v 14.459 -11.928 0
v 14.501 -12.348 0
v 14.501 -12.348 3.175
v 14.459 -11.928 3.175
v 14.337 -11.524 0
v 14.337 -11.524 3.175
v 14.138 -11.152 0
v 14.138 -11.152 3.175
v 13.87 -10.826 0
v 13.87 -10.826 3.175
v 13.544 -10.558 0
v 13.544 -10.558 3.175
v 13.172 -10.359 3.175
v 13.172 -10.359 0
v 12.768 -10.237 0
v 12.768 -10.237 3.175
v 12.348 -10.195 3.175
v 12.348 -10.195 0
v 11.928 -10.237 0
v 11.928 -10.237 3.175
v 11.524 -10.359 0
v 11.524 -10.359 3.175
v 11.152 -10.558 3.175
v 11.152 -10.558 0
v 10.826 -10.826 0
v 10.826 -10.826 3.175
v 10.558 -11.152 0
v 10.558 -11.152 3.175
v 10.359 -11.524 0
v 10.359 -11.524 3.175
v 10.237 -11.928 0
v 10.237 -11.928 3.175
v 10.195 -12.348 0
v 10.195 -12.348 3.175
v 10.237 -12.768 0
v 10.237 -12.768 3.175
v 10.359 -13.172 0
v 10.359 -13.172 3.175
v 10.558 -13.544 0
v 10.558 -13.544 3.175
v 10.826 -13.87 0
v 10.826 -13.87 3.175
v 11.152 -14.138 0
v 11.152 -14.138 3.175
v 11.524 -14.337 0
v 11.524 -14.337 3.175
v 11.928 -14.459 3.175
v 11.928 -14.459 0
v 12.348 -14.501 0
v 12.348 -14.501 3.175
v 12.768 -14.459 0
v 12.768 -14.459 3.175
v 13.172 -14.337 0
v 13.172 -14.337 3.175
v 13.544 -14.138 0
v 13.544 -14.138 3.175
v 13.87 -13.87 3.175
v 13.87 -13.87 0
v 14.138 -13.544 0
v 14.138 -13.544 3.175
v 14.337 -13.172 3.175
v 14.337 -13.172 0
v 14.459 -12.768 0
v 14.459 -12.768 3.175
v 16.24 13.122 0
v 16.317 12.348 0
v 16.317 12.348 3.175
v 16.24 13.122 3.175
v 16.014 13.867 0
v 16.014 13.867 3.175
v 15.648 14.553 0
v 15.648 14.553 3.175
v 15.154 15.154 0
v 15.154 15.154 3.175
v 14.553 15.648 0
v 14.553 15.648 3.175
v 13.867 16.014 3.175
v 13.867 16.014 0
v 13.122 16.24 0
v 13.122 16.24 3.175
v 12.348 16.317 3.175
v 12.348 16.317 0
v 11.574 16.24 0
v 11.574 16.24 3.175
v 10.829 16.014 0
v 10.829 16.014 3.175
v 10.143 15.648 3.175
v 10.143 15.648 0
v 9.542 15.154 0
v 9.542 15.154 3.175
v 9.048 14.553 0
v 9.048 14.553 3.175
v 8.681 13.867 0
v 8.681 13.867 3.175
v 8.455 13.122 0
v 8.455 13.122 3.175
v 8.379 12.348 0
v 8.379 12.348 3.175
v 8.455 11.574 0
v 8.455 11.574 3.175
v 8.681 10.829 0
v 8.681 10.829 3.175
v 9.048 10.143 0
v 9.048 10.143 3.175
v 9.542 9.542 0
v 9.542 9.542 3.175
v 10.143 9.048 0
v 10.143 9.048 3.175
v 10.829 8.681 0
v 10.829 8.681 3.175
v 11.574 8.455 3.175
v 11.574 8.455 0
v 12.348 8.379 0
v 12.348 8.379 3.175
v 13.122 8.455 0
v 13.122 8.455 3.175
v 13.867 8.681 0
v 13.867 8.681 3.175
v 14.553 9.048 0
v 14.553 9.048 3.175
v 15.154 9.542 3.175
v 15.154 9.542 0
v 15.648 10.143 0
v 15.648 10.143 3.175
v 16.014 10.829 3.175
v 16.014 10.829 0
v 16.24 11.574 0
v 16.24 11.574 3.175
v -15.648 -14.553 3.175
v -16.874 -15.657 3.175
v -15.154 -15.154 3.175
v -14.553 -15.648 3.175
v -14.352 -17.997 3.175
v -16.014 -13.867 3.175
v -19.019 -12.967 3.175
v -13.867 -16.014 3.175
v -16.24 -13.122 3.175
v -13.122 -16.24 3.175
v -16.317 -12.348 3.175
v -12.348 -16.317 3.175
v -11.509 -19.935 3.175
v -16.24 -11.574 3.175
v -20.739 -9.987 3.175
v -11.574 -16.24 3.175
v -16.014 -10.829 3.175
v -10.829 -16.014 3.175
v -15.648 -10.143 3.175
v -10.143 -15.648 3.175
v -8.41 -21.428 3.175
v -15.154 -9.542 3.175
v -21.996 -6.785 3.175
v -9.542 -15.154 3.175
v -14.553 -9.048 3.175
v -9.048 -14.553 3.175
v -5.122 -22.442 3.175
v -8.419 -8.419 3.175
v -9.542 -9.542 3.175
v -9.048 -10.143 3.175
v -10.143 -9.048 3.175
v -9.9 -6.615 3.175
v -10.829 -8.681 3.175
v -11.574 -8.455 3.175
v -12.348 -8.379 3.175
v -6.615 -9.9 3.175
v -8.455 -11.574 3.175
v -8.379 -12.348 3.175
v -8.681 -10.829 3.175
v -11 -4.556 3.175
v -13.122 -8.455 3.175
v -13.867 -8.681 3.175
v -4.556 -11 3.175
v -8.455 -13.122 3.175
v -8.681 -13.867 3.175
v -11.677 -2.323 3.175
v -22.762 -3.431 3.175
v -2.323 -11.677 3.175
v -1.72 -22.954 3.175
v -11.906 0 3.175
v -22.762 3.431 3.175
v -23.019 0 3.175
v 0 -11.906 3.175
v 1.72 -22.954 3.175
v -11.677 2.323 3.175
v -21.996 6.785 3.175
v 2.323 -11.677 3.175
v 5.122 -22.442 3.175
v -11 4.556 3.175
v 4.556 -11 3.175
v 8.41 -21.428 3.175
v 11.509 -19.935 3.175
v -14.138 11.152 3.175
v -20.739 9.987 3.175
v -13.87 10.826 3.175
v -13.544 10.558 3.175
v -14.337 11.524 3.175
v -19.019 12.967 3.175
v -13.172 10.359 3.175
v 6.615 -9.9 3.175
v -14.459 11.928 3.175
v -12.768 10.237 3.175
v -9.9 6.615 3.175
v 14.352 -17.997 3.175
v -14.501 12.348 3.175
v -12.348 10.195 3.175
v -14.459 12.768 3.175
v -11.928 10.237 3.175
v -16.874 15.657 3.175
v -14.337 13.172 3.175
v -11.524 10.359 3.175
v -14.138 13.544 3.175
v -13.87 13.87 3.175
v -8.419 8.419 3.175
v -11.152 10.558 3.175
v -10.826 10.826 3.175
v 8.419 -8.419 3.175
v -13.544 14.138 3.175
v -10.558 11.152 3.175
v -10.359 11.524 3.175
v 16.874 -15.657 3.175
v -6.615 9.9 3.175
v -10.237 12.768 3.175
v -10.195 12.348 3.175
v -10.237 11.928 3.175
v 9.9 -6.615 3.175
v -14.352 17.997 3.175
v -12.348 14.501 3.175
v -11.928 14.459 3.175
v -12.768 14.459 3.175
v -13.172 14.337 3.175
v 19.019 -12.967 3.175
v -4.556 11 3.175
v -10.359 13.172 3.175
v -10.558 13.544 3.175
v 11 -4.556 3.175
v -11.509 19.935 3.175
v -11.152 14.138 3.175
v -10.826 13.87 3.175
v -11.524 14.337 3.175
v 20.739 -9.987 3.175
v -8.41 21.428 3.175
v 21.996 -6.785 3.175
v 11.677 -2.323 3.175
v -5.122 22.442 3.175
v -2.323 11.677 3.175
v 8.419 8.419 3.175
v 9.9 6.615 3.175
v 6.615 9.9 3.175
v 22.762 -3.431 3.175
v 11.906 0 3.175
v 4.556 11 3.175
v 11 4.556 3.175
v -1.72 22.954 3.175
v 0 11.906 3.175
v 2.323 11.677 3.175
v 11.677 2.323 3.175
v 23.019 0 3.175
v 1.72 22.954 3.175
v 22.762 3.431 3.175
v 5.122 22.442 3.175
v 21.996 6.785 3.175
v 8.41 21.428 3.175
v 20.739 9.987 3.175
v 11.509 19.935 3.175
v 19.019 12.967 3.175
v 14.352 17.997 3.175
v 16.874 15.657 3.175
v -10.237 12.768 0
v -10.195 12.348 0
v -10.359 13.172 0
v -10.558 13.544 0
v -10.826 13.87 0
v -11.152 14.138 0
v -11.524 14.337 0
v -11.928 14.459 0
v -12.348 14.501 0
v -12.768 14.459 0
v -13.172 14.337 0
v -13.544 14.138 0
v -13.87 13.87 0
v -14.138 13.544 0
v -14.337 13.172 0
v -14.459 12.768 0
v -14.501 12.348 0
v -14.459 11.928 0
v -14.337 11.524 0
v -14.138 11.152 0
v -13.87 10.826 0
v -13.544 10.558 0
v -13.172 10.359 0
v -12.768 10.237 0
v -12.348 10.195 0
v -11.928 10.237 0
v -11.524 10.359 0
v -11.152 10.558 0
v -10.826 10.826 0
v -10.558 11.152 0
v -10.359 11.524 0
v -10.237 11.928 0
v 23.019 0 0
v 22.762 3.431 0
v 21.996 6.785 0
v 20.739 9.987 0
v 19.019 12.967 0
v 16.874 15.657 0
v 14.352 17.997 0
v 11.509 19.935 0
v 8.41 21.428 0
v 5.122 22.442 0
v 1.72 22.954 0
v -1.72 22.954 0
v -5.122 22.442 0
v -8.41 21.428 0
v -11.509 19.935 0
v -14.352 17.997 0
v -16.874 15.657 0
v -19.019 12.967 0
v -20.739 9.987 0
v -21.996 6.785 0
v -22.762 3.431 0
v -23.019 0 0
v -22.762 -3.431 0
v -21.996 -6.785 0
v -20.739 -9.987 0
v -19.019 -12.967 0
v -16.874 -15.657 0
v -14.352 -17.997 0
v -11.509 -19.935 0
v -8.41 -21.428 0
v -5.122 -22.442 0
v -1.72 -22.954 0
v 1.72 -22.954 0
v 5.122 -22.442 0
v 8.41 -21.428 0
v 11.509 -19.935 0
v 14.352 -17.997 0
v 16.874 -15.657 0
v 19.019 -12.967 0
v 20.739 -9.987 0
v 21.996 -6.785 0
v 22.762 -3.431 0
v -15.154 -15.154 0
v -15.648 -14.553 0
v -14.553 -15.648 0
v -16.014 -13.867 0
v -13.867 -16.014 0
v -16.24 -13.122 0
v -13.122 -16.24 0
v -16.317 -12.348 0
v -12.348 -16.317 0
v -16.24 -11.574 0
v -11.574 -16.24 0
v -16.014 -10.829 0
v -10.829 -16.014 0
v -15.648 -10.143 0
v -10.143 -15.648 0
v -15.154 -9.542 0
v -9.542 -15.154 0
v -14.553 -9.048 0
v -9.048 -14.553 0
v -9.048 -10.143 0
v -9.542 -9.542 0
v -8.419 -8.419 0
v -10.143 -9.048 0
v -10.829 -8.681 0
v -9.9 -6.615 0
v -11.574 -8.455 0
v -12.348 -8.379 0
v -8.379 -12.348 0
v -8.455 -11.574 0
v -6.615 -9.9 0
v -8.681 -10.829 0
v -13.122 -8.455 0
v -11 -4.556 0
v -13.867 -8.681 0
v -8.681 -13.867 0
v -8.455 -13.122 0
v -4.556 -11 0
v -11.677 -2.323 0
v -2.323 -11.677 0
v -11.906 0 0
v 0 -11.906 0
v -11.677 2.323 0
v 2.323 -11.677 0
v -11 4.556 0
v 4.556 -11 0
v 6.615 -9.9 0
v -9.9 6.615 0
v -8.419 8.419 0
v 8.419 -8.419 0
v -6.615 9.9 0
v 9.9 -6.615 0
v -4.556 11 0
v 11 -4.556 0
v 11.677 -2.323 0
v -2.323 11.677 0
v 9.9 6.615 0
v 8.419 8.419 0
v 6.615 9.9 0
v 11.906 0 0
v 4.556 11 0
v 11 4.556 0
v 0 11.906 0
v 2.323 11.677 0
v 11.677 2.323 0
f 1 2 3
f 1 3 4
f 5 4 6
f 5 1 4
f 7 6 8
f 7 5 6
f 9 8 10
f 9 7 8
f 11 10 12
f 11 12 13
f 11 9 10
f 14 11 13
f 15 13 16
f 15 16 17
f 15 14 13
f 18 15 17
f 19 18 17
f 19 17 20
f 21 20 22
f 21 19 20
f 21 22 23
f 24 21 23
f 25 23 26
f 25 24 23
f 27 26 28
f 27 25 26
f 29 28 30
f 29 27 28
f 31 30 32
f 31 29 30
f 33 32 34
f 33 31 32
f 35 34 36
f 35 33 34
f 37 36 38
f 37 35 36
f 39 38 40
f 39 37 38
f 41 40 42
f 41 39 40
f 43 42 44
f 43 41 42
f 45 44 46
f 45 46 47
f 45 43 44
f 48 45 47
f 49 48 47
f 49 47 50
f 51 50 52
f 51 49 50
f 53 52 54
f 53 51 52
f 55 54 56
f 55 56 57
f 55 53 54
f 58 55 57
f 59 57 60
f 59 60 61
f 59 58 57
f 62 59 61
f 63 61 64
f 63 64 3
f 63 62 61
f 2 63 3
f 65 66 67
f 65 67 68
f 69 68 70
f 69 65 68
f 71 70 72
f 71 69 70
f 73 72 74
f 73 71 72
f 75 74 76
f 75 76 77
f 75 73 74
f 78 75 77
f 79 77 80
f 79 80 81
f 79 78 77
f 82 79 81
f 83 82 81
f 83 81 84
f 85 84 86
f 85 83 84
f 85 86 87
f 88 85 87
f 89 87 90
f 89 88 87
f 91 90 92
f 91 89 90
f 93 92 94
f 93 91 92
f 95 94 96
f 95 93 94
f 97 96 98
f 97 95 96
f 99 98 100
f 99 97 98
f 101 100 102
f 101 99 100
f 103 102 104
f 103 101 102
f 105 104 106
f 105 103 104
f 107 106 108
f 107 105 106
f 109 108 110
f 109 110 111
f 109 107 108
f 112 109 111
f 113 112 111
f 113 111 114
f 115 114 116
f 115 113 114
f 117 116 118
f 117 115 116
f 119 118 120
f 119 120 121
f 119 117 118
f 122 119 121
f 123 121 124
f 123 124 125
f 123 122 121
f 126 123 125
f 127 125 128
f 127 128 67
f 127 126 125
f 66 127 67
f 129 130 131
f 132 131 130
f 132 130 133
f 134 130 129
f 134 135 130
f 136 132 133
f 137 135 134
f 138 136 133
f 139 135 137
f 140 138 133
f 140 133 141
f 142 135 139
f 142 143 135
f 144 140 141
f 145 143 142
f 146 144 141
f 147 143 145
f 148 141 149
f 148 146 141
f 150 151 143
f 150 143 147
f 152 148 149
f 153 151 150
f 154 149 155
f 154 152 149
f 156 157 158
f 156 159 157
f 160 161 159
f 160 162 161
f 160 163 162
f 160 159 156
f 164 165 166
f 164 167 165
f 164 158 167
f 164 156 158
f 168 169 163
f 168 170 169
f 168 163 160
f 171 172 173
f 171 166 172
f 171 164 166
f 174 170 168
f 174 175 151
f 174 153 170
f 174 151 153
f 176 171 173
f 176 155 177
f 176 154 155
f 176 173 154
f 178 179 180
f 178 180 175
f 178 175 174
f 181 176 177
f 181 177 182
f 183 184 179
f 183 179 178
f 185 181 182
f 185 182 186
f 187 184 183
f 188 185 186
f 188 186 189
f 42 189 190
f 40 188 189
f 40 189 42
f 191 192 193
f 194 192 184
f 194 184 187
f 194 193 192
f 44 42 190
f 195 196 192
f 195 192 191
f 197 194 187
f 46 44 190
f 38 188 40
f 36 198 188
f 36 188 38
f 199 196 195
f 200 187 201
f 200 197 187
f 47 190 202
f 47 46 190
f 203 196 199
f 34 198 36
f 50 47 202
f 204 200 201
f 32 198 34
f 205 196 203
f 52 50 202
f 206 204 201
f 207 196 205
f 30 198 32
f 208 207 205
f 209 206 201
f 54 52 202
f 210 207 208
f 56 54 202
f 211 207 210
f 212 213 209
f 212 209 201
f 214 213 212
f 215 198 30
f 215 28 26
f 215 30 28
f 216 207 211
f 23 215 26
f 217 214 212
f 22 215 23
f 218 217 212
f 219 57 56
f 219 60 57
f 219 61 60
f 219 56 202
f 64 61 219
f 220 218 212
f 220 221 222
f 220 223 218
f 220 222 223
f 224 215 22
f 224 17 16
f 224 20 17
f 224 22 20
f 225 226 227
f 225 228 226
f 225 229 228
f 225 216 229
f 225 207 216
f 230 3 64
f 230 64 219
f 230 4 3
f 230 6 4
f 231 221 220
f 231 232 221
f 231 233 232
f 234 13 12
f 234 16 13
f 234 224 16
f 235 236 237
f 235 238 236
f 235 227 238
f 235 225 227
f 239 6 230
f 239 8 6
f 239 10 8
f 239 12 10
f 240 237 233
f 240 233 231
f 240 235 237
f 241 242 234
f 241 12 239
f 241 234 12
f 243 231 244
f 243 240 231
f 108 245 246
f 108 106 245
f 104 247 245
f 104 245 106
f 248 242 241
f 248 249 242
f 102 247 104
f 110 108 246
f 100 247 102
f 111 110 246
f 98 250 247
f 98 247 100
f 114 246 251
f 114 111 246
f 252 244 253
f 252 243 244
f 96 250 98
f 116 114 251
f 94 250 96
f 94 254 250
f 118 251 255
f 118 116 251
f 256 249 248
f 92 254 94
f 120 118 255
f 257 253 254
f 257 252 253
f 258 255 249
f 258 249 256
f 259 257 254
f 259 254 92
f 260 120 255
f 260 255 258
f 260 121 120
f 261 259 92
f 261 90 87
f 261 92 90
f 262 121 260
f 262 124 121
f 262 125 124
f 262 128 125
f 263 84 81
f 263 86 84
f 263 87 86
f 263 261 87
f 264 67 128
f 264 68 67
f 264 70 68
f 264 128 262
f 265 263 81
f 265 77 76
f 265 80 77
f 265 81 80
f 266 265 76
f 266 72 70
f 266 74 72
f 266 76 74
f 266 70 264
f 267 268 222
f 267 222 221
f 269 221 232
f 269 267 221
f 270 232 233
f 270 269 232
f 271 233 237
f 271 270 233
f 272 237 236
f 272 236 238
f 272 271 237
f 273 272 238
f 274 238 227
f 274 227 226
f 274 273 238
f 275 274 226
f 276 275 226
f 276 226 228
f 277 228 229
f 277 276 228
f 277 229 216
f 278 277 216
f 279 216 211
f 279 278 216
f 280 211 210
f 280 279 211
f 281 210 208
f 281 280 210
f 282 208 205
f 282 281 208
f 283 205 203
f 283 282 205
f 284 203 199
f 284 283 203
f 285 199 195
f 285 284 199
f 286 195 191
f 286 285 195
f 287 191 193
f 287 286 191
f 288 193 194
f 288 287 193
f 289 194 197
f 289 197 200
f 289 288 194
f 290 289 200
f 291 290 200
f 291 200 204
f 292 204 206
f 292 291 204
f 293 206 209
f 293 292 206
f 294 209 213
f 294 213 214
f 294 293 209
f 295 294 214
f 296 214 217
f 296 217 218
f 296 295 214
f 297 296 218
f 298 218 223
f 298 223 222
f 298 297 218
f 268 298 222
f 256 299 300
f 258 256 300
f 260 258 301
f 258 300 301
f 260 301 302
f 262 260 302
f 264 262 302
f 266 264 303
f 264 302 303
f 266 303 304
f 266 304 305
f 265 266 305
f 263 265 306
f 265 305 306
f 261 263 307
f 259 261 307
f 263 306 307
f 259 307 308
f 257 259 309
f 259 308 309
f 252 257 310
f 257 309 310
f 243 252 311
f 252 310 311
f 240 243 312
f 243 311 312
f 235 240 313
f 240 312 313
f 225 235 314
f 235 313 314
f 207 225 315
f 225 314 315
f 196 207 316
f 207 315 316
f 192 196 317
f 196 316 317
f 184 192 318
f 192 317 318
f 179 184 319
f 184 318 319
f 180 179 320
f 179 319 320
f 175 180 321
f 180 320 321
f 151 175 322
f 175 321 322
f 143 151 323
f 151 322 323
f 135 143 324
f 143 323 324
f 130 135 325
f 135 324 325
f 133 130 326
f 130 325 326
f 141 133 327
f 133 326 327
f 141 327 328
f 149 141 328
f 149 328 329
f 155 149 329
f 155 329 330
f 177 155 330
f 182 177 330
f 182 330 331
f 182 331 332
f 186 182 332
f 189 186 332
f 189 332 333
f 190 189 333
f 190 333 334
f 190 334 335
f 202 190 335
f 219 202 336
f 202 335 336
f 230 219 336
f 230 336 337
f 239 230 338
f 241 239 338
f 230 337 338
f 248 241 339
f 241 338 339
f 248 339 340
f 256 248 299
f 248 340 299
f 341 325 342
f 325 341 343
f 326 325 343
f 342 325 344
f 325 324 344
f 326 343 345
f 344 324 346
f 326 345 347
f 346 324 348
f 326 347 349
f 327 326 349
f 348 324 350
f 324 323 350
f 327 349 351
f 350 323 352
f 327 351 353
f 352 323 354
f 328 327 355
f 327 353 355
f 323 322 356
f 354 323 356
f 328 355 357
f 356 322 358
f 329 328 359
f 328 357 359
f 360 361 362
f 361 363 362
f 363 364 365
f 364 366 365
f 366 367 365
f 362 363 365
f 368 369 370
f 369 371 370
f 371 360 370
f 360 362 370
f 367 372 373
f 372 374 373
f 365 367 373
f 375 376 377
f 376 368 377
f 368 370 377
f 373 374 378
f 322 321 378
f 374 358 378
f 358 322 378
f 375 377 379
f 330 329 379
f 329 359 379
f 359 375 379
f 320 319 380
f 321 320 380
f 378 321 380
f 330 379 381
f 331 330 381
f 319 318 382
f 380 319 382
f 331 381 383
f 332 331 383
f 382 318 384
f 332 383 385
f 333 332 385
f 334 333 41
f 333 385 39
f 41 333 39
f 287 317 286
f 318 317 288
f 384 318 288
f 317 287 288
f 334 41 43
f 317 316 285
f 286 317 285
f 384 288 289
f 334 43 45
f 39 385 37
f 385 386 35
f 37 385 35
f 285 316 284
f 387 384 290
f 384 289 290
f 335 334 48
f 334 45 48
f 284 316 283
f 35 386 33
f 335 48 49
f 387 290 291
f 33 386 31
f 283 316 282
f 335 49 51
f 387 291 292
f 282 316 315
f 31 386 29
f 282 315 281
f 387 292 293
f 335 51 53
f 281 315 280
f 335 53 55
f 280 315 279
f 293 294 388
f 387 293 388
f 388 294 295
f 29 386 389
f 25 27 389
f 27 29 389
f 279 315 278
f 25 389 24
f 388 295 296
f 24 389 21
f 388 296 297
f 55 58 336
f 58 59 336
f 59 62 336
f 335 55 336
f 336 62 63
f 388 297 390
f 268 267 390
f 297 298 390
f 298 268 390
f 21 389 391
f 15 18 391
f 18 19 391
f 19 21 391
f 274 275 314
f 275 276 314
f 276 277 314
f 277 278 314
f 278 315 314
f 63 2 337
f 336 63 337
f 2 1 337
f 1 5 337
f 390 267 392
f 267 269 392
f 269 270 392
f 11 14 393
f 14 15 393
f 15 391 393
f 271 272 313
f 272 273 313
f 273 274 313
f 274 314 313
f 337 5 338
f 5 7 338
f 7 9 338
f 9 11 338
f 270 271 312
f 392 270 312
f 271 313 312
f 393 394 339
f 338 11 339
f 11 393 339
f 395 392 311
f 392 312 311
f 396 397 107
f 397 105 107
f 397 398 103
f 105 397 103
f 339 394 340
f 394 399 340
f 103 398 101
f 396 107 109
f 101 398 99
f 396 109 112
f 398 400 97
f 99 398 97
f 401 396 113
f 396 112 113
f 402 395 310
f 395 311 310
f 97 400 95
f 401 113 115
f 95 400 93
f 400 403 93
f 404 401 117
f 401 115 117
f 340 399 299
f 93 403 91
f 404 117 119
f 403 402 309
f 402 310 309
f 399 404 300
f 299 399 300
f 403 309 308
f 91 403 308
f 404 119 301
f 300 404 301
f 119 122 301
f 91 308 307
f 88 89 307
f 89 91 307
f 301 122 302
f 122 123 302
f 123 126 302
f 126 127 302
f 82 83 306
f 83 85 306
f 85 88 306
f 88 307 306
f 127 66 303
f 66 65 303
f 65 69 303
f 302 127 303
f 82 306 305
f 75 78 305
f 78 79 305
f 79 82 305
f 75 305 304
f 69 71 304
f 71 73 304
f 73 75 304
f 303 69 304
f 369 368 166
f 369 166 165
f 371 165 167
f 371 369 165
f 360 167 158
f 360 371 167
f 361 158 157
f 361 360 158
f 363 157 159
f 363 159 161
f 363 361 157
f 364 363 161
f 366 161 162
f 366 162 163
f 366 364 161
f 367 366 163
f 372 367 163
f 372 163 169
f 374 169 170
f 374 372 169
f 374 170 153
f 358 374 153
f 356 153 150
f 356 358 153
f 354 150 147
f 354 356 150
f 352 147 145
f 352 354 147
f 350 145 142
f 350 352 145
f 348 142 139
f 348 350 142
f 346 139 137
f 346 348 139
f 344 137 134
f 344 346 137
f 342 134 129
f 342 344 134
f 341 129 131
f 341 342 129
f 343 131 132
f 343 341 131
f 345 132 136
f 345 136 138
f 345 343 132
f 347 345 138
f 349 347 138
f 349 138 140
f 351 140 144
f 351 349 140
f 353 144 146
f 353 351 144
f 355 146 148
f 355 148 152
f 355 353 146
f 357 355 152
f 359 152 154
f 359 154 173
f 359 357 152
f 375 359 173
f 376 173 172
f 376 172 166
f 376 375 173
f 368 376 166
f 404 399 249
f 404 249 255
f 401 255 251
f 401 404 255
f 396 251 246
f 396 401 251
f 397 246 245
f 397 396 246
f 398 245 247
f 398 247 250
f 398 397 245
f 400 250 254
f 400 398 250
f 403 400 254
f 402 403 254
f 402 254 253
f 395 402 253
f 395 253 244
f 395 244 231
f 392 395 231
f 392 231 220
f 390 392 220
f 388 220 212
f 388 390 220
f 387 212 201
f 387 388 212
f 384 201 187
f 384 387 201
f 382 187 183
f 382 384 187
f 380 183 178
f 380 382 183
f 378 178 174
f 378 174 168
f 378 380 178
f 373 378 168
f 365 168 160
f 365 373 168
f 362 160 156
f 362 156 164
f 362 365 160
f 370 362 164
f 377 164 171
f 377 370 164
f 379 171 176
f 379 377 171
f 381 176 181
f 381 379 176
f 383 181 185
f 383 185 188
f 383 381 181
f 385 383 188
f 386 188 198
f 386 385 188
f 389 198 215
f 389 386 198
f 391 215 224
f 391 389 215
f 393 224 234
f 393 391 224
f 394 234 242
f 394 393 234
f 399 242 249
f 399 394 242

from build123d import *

# Parameters (mm, degrees)
F0_R     = 23.01875
F0_R_2   = 3.96875
F0_R_3   = 2.15265
F0_R_4   = 11.90625
F1_DEPTH = 3.175


with BuildPart() as f1:
    # F0 (on Top) → F1 (new body)
    with BuildSketch(Plane.XY):
        Circle(F0_R)
        with Locations((-12.347852, -12.347852)):
            Circle(F0_R_2, mode=Mode.SUBTRACT)
        with Locations((12.347852, -12.347852)):
            Circle(F0_R_3, mode=Mode.SUBTRACT)
        with Locations((-12.347852, 12.347852)):
            Circle(F0_R_3, mode=Mode.SUBTRACT)
        Circle(F0_R_4, mode=Mode.SUBTRACT)
        with Locations((12.347852, 12.347852)):
            Circle(F0_R_2, mode=Mode.SUBTRACT)
    extrude(amount=F1_DEPTH)


solid = f1.part
